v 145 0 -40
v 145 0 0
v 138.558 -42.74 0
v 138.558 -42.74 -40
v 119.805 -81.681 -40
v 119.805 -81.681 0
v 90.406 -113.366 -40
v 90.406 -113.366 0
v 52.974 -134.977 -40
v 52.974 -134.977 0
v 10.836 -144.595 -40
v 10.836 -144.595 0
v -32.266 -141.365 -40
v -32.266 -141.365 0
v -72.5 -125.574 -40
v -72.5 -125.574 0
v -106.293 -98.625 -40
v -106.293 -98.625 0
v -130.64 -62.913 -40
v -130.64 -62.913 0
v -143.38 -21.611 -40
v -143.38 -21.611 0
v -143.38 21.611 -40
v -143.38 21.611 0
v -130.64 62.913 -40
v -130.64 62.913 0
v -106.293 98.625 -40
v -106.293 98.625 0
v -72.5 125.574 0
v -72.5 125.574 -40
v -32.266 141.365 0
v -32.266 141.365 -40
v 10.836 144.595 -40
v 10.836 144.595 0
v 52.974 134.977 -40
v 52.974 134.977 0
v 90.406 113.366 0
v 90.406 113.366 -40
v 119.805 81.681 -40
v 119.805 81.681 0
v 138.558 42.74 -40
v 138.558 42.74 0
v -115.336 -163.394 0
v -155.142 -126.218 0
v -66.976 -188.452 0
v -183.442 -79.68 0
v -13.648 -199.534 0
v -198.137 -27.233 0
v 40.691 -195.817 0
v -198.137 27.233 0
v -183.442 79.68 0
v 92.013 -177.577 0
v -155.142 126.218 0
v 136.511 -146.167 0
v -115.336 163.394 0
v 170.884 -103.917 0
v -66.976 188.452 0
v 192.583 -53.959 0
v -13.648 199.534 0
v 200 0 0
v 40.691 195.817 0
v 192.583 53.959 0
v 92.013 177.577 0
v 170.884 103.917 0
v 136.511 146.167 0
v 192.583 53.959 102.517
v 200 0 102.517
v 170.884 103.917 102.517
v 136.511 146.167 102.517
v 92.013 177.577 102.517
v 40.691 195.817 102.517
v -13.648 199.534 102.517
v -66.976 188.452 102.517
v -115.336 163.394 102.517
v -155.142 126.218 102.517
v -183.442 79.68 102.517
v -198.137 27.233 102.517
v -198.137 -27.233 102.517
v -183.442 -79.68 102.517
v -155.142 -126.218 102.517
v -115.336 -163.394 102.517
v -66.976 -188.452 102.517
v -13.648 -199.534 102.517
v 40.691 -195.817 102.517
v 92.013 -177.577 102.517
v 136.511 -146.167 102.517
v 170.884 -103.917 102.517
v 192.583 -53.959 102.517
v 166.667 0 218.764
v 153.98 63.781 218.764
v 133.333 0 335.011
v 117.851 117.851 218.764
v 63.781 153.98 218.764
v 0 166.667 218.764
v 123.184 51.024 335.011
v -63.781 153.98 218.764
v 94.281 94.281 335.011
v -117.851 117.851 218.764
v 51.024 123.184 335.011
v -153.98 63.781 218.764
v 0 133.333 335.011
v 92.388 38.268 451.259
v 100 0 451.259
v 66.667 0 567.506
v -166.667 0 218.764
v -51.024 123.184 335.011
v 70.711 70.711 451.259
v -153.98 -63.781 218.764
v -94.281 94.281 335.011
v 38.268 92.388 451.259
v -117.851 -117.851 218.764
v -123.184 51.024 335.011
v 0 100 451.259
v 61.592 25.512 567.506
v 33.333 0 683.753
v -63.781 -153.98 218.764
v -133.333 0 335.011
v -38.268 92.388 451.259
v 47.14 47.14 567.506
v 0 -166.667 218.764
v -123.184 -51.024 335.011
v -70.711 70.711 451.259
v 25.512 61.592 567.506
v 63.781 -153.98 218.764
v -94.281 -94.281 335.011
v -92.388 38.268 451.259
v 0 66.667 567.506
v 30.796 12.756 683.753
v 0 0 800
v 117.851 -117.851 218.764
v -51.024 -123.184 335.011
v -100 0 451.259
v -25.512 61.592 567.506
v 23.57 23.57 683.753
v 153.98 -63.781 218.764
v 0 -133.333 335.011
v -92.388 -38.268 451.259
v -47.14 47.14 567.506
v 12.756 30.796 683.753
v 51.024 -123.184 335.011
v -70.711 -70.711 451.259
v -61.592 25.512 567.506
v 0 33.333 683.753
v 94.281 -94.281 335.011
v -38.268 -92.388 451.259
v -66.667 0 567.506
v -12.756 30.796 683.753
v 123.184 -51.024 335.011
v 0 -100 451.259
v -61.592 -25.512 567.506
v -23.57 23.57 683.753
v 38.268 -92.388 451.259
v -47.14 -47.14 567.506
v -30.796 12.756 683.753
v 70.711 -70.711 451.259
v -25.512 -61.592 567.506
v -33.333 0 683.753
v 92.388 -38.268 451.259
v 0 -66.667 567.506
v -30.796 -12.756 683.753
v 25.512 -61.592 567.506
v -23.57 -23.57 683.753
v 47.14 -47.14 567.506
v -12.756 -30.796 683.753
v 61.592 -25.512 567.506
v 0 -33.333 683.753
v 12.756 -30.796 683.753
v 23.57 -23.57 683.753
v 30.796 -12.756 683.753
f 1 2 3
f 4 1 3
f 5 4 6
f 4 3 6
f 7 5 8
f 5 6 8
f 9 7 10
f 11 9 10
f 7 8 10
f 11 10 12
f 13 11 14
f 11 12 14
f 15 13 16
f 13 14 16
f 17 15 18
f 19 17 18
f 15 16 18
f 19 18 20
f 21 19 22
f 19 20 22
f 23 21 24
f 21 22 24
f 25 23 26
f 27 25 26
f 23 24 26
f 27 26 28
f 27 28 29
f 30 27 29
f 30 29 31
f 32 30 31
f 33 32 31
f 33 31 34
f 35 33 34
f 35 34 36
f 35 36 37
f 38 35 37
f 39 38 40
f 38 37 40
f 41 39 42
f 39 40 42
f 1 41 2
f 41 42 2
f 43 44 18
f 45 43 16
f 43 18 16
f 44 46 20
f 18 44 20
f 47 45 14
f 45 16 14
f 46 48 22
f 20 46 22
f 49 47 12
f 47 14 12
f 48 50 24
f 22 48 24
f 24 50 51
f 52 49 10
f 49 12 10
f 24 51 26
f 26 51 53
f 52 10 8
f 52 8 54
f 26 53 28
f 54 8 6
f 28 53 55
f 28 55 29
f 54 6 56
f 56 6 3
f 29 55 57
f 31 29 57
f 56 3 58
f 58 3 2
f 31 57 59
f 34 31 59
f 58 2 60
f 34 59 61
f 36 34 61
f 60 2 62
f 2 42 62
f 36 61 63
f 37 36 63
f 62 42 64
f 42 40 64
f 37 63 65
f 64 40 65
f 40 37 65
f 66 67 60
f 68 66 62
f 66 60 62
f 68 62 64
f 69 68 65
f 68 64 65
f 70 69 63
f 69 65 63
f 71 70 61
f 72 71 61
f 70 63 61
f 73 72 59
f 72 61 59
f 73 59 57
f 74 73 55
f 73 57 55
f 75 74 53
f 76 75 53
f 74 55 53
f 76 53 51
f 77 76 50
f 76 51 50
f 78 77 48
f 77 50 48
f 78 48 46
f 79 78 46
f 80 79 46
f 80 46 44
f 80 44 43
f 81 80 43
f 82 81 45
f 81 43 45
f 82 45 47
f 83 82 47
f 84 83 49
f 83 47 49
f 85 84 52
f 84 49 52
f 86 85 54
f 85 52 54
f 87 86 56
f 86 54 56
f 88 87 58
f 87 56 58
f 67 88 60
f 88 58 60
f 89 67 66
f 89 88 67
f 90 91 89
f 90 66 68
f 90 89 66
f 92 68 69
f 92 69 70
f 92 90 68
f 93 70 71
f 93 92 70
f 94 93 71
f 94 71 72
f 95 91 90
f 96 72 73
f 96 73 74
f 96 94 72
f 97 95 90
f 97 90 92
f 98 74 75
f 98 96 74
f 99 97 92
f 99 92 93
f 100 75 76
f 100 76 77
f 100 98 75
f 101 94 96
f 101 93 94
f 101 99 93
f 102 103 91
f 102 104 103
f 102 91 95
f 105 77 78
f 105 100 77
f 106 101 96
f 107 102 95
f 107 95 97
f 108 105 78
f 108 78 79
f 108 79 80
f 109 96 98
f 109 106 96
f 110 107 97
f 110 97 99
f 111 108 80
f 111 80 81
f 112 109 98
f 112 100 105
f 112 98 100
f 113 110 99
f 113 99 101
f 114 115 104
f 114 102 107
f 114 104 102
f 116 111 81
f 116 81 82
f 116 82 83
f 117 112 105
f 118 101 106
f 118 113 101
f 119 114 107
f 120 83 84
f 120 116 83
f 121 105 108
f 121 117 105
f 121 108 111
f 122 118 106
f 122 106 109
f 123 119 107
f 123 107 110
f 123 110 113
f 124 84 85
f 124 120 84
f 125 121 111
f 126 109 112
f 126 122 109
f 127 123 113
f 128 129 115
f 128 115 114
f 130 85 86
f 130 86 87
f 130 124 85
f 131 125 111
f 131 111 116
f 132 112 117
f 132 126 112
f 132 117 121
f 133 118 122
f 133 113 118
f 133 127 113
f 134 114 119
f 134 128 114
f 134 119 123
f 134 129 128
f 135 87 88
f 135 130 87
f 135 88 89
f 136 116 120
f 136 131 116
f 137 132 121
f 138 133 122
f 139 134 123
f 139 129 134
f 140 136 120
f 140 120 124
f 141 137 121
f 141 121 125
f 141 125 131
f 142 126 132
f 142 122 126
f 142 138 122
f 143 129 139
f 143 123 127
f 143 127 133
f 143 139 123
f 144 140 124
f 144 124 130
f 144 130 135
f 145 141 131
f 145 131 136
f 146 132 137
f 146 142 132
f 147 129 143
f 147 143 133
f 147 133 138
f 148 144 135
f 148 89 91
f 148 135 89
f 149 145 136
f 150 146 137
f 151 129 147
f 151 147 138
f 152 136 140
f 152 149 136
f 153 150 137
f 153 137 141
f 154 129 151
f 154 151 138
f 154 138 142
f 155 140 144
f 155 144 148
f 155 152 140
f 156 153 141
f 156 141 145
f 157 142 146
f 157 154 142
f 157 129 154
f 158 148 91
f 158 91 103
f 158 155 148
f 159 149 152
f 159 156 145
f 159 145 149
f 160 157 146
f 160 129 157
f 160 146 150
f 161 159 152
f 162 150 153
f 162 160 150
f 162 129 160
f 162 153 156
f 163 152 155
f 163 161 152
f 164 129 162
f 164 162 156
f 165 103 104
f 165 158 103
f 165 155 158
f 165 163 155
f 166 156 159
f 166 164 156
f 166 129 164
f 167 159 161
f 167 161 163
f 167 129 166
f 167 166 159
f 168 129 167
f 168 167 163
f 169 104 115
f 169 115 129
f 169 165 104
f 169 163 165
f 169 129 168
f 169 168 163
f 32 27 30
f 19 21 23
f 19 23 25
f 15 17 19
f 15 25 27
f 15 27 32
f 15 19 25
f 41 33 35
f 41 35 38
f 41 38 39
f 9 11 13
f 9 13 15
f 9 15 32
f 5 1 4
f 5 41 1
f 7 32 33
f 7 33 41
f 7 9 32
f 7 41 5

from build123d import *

# Parameters (mm, degrees)
F0_R     = 200
F1_DEPTH = 800
F2_SIZE2 = 200
F2_SIZE  = 697.4828887682
F3_R     = 145
F4_DEPTH = 40


with BuildPart() as f1:
    # F0 (on Top) → F1 (new body)
    with BuildSketch(Plane.XY):
        Circle(F0_R)
    extrude(amount=F1_DEPTH)

    # F2
    f2_edges = [f1.edges().sort_by_distance(p)[0] for p in [
        (-200, 0, 800),
    ]]
    f2_side = f1.faces().sort_by_distance((-200, 0, 400))[0]
    chamfer(f2_edges, length=F2_SIZE, length2=F2_SIZE2, reference=f2_side)

    # F3 (on face) → F4 (join)
    with BuildSketch(Plane(origin=(0, 0, 0), x_dir=(1, 0, 0), z_dir=(0, 0, -1))):
        Circle(F3_R)
    extrude(amount=F4_DEPTH)


solid = f1.part
